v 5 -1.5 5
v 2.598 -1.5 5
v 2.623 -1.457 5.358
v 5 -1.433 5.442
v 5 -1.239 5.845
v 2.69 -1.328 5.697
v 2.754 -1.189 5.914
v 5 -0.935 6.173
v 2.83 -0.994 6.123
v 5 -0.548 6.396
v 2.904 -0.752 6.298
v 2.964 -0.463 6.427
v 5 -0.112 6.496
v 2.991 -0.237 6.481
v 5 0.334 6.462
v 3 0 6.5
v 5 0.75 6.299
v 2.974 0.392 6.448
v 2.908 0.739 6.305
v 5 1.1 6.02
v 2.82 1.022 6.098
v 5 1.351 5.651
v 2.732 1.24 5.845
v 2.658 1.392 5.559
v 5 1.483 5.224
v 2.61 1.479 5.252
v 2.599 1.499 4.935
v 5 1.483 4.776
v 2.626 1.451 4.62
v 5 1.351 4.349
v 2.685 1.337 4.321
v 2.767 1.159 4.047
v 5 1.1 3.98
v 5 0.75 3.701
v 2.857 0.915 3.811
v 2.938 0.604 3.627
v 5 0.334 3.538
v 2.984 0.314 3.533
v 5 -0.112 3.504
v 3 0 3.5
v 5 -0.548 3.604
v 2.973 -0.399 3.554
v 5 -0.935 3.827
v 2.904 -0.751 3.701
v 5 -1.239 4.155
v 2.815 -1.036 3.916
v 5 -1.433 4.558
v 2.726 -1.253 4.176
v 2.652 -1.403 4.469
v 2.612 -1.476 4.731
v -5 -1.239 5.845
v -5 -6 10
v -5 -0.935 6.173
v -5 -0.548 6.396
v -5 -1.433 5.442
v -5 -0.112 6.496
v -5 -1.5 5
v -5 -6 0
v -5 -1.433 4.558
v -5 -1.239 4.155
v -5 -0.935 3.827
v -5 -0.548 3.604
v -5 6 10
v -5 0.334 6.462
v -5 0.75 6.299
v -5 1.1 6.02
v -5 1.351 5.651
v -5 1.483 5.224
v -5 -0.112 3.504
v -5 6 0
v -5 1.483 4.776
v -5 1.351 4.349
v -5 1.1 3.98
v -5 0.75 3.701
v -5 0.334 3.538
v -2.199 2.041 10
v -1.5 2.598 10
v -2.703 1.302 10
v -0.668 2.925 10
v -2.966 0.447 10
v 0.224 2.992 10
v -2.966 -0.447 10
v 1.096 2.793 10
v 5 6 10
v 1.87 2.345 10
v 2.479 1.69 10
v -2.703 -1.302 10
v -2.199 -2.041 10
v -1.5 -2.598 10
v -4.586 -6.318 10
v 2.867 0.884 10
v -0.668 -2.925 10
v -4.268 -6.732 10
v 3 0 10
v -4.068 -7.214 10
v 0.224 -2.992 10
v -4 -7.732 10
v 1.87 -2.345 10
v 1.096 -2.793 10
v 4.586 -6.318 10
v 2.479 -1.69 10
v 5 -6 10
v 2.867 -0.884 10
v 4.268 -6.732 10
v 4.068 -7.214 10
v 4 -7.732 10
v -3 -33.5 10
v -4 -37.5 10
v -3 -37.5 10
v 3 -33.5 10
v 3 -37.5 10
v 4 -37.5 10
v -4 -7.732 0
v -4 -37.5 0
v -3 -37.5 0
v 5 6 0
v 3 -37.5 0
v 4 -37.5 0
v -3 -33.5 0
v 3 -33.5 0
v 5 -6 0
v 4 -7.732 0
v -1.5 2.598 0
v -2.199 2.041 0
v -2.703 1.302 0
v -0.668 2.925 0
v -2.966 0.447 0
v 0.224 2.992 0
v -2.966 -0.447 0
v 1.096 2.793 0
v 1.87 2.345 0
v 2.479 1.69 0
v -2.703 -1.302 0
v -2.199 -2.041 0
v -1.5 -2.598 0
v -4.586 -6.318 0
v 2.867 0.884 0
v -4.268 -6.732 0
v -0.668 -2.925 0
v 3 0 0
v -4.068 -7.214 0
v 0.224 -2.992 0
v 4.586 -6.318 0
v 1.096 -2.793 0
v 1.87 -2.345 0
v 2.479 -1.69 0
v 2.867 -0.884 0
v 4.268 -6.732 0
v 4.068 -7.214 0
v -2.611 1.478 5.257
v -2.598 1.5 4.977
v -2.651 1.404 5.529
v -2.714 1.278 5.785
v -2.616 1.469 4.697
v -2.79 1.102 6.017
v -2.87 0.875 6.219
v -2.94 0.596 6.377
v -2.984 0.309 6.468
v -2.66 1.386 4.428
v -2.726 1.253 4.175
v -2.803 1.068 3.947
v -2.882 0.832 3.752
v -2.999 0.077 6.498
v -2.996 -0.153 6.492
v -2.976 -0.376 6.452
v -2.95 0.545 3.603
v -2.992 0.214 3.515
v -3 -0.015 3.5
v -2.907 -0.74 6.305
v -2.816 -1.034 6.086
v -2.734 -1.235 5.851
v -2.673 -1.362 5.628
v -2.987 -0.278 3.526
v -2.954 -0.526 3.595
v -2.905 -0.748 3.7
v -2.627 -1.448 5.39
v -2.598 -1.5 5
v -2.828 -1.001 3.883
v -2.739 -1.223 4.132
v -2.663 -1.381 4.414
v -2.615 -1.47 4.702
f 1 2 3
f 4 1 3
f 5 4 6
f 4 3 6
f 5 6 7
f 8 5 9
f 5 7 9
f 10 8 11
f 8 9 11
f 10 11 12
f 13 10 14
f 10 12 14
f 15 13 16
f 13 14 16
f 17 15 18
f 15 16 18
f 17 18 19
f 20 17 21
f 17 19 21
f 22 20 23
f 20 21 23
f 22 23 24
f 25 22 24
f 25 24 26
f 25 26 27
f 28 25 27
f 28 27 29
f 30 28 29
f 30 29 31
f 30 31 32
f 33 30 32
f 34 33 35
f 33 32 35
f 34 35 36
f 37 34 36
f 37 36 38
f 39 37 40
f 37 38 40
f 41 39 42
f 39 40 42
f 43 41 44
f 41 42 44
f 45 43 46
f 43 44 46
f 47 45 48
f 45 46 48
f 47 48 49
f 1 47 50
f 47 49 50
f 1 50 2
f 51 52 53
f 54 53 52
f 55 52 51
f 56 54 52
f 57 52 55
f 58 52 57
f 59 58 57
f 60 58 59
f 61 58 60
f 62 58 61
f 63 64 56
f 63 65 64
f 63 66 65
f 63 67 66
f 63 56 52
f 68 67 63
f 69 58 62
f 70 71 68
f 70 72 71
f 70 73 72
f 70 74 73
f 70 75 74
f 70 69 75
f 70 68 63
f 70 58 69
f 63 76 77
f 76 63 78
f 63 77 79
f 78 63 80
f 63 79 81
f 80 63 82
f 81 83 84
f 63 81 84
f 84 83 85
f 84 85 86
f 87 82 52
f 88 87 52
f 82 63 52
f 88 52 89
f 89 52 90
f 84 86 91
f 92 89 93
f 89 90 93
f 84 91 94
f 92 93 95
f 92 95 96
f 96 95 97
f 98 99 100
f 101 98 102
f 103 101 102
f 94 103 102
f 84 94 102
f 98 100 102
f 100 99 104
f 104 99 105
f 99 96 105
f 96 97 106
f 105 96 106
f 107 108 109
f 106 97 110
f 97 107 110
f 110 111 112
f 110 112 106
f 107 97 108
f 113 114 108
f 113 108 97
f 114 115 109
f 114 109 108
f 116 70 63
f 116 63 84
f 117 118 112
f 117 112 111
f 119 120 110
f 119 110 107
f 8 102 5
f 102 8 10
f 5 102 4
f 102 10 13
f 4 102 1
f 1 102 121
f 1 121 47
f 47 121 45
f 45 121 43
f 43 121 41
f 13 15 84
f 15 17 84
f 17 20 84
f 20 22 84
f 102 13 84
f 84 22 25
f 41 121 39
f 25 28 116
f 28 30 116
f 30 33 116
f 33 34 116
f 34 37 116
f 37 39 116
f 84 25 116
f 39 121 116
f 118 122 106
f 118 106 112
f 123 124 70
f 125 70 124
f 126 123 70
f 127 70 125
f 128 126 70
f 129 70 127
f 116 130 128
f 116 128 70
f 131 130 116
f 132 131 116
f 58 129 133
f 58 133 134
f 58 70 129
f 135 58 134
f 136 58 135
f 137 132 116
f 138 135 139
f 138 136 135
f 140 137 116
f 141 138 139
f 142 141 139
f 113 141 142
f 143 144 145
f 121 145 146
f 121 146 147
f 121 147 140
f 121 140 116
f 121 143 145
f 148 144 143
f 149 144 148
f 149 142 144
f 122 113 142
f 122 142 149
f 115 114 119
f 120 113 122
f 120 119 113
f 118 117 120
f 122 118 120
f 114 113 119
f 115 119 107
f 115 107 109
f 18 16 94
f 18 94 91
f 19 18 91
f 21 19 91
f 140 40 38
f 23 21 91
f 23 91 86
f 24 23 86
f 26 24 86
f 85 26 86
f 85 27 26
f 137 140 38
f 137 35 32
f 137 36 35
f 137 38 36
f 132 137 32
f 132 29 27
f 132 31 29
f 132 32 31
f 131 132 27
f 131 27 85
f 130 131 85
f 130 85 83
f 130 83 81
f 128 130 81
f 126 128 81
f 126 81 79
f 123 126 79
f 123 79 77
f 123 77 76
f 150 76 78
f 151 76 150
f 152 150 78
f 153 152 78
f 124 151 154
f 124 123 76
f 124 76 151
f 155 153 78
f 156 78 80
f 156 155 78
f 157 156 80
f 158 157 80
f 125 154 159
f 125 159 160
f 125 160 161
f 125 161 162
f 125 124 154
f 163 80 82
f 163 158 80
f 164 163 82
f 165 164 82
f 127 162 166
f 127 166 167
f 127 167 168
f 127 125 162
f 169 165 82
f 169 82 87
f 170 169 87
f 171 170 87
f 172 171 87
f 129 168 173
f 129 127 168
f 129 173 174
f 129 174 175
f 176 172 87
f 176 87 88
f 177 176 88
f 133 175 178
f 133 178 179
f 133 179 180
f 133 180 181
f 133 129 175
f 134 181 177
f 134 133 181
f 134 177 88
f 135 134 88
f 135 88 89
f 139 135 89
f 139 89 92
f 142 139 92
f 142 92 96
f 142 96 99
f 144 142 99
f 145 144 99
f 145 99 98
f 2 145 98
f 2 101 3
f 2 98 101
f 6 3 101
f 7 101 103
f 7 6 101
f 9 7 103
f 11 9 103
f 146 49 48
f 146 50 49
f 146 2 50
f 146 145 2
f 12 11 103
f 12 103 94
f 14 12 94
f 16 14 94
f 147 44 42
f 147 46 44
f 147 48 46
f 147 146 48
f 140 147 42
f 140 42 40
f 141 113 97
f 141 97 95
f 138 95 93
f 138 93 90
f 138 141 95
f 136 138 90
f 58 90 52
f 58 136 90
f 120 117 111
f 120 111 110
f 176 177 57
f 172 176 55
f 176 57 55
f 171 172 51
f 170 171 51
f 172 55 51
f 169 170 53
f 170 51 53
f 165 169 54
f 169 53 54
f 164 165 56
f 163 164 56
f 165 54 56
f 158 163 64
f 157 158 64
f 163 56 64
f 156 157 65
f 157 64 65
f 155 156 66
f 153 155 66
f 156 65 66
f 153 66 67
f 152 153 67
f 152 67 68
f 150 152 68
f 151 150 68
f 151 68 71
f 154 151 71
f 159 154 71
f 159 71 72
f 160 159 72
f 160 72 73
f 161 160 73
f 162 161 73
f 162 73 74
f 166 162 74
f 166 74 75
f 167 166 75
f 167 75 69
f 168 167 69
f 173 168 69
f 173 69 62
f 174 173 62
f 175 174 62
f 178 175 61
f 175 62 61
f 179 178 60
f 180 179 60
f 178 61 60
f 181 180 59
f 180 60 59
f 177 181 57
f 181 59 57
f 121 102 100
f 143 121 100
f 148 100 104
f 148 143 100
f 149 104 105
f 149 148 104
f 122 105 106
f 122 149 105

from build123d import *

# Parameters (mm, degrees)
SKETCH1_W           = 10
SKETCH1_H           = 12
SKETCH1_R           = 3
BOSS_EXTRUDE1_DEPTH = 10
SKETCH2_R           = 1.5
CUT_EXTRUDE1_DEPTH  = 41.078048855
FILLET1_R           = 2


with BuildPart() as part:
    # Sketch1 → Boss-Extrude1 (new body)
    # profile 1 of 2: a face of its own
    with BuildSketch(Plane.XY):
        Rectangle(SKETCH1_W, SKETCH1_H)
        Circle(SKETCH1_R, mode=Mode.SUBTRACT)
    # profile 2 of 2: a face of its own
    with BuildSketch(Plane.XY):
        Polygon((-4, -6), (4, -6), (4, -37.5), (3, -37.5), (3, -33.5), (-3, -33.5), (-3, -37.5), (-4, -37.5), align=None)
    extrude(amount=BOSS_EXTRUDE1_DEPTH)

    # Sketch2 → Cut-Extrude1 (cut, through all)
    with BuildSketch(Plane.ZY.offset(5)):
        with Locations(Location((5, 0, 0), (0, 0, 270))):
            Circle(SKETCH2_R)
    extrude(amount=-CUT_EXTRUDE1_DEPTH, mode=Mode.SUBTRACT)

    # Fillet1
    # the kernel refuses this fillet: 2 mm, written as the material it adds along each edge
    with BuildSketch(Plane(origin=(4, -6, 0), x_dir=(1, 0, 0), z_dir=(0, 0, 1))) as fillet1_piece_1:
        with BuildLine():
            CenterArc((2, -1.732050808), FILLET1_R, 120, 60)
            Line((0, -1.732050808), (-0.04, -1.732050808))
            Line((-0.04, -1.732050808), (-0.04, 0))
            Line((-0.04, 0), (0, 0.04))
            ThreePointArc((0, 0.04), (0.5, 0.04), (0.98, 0.034641016))
            Line((0.98, 0.034641016), (1, 0))
        make_face()
    extrude(amount=10)
    with BuildSketch(Plane(origin=(-4, -6, 0), x_dir=(-1, 0, 0), z_dir=(0, 0, 1))) as fillet1_piece_2:
        with BuildLine():
            CenterArc((2, 1.732050808), FILLET1_R, 180, 60)
            Line((0, 1.732050808), (-0.04, 1.732050808))
            Line((-0.04, 1.732050808), (-0.04, 0))
            Line((-0.04, 0), (0, -0.04))
            ThreePointArc((0, -0.04), (0.5, -0.04), (0.98, -0.034641016))
            Line((0.98, -0.034641016), (1, 0))
        make_face()
    extrude(amount=10)


solid = part.part
